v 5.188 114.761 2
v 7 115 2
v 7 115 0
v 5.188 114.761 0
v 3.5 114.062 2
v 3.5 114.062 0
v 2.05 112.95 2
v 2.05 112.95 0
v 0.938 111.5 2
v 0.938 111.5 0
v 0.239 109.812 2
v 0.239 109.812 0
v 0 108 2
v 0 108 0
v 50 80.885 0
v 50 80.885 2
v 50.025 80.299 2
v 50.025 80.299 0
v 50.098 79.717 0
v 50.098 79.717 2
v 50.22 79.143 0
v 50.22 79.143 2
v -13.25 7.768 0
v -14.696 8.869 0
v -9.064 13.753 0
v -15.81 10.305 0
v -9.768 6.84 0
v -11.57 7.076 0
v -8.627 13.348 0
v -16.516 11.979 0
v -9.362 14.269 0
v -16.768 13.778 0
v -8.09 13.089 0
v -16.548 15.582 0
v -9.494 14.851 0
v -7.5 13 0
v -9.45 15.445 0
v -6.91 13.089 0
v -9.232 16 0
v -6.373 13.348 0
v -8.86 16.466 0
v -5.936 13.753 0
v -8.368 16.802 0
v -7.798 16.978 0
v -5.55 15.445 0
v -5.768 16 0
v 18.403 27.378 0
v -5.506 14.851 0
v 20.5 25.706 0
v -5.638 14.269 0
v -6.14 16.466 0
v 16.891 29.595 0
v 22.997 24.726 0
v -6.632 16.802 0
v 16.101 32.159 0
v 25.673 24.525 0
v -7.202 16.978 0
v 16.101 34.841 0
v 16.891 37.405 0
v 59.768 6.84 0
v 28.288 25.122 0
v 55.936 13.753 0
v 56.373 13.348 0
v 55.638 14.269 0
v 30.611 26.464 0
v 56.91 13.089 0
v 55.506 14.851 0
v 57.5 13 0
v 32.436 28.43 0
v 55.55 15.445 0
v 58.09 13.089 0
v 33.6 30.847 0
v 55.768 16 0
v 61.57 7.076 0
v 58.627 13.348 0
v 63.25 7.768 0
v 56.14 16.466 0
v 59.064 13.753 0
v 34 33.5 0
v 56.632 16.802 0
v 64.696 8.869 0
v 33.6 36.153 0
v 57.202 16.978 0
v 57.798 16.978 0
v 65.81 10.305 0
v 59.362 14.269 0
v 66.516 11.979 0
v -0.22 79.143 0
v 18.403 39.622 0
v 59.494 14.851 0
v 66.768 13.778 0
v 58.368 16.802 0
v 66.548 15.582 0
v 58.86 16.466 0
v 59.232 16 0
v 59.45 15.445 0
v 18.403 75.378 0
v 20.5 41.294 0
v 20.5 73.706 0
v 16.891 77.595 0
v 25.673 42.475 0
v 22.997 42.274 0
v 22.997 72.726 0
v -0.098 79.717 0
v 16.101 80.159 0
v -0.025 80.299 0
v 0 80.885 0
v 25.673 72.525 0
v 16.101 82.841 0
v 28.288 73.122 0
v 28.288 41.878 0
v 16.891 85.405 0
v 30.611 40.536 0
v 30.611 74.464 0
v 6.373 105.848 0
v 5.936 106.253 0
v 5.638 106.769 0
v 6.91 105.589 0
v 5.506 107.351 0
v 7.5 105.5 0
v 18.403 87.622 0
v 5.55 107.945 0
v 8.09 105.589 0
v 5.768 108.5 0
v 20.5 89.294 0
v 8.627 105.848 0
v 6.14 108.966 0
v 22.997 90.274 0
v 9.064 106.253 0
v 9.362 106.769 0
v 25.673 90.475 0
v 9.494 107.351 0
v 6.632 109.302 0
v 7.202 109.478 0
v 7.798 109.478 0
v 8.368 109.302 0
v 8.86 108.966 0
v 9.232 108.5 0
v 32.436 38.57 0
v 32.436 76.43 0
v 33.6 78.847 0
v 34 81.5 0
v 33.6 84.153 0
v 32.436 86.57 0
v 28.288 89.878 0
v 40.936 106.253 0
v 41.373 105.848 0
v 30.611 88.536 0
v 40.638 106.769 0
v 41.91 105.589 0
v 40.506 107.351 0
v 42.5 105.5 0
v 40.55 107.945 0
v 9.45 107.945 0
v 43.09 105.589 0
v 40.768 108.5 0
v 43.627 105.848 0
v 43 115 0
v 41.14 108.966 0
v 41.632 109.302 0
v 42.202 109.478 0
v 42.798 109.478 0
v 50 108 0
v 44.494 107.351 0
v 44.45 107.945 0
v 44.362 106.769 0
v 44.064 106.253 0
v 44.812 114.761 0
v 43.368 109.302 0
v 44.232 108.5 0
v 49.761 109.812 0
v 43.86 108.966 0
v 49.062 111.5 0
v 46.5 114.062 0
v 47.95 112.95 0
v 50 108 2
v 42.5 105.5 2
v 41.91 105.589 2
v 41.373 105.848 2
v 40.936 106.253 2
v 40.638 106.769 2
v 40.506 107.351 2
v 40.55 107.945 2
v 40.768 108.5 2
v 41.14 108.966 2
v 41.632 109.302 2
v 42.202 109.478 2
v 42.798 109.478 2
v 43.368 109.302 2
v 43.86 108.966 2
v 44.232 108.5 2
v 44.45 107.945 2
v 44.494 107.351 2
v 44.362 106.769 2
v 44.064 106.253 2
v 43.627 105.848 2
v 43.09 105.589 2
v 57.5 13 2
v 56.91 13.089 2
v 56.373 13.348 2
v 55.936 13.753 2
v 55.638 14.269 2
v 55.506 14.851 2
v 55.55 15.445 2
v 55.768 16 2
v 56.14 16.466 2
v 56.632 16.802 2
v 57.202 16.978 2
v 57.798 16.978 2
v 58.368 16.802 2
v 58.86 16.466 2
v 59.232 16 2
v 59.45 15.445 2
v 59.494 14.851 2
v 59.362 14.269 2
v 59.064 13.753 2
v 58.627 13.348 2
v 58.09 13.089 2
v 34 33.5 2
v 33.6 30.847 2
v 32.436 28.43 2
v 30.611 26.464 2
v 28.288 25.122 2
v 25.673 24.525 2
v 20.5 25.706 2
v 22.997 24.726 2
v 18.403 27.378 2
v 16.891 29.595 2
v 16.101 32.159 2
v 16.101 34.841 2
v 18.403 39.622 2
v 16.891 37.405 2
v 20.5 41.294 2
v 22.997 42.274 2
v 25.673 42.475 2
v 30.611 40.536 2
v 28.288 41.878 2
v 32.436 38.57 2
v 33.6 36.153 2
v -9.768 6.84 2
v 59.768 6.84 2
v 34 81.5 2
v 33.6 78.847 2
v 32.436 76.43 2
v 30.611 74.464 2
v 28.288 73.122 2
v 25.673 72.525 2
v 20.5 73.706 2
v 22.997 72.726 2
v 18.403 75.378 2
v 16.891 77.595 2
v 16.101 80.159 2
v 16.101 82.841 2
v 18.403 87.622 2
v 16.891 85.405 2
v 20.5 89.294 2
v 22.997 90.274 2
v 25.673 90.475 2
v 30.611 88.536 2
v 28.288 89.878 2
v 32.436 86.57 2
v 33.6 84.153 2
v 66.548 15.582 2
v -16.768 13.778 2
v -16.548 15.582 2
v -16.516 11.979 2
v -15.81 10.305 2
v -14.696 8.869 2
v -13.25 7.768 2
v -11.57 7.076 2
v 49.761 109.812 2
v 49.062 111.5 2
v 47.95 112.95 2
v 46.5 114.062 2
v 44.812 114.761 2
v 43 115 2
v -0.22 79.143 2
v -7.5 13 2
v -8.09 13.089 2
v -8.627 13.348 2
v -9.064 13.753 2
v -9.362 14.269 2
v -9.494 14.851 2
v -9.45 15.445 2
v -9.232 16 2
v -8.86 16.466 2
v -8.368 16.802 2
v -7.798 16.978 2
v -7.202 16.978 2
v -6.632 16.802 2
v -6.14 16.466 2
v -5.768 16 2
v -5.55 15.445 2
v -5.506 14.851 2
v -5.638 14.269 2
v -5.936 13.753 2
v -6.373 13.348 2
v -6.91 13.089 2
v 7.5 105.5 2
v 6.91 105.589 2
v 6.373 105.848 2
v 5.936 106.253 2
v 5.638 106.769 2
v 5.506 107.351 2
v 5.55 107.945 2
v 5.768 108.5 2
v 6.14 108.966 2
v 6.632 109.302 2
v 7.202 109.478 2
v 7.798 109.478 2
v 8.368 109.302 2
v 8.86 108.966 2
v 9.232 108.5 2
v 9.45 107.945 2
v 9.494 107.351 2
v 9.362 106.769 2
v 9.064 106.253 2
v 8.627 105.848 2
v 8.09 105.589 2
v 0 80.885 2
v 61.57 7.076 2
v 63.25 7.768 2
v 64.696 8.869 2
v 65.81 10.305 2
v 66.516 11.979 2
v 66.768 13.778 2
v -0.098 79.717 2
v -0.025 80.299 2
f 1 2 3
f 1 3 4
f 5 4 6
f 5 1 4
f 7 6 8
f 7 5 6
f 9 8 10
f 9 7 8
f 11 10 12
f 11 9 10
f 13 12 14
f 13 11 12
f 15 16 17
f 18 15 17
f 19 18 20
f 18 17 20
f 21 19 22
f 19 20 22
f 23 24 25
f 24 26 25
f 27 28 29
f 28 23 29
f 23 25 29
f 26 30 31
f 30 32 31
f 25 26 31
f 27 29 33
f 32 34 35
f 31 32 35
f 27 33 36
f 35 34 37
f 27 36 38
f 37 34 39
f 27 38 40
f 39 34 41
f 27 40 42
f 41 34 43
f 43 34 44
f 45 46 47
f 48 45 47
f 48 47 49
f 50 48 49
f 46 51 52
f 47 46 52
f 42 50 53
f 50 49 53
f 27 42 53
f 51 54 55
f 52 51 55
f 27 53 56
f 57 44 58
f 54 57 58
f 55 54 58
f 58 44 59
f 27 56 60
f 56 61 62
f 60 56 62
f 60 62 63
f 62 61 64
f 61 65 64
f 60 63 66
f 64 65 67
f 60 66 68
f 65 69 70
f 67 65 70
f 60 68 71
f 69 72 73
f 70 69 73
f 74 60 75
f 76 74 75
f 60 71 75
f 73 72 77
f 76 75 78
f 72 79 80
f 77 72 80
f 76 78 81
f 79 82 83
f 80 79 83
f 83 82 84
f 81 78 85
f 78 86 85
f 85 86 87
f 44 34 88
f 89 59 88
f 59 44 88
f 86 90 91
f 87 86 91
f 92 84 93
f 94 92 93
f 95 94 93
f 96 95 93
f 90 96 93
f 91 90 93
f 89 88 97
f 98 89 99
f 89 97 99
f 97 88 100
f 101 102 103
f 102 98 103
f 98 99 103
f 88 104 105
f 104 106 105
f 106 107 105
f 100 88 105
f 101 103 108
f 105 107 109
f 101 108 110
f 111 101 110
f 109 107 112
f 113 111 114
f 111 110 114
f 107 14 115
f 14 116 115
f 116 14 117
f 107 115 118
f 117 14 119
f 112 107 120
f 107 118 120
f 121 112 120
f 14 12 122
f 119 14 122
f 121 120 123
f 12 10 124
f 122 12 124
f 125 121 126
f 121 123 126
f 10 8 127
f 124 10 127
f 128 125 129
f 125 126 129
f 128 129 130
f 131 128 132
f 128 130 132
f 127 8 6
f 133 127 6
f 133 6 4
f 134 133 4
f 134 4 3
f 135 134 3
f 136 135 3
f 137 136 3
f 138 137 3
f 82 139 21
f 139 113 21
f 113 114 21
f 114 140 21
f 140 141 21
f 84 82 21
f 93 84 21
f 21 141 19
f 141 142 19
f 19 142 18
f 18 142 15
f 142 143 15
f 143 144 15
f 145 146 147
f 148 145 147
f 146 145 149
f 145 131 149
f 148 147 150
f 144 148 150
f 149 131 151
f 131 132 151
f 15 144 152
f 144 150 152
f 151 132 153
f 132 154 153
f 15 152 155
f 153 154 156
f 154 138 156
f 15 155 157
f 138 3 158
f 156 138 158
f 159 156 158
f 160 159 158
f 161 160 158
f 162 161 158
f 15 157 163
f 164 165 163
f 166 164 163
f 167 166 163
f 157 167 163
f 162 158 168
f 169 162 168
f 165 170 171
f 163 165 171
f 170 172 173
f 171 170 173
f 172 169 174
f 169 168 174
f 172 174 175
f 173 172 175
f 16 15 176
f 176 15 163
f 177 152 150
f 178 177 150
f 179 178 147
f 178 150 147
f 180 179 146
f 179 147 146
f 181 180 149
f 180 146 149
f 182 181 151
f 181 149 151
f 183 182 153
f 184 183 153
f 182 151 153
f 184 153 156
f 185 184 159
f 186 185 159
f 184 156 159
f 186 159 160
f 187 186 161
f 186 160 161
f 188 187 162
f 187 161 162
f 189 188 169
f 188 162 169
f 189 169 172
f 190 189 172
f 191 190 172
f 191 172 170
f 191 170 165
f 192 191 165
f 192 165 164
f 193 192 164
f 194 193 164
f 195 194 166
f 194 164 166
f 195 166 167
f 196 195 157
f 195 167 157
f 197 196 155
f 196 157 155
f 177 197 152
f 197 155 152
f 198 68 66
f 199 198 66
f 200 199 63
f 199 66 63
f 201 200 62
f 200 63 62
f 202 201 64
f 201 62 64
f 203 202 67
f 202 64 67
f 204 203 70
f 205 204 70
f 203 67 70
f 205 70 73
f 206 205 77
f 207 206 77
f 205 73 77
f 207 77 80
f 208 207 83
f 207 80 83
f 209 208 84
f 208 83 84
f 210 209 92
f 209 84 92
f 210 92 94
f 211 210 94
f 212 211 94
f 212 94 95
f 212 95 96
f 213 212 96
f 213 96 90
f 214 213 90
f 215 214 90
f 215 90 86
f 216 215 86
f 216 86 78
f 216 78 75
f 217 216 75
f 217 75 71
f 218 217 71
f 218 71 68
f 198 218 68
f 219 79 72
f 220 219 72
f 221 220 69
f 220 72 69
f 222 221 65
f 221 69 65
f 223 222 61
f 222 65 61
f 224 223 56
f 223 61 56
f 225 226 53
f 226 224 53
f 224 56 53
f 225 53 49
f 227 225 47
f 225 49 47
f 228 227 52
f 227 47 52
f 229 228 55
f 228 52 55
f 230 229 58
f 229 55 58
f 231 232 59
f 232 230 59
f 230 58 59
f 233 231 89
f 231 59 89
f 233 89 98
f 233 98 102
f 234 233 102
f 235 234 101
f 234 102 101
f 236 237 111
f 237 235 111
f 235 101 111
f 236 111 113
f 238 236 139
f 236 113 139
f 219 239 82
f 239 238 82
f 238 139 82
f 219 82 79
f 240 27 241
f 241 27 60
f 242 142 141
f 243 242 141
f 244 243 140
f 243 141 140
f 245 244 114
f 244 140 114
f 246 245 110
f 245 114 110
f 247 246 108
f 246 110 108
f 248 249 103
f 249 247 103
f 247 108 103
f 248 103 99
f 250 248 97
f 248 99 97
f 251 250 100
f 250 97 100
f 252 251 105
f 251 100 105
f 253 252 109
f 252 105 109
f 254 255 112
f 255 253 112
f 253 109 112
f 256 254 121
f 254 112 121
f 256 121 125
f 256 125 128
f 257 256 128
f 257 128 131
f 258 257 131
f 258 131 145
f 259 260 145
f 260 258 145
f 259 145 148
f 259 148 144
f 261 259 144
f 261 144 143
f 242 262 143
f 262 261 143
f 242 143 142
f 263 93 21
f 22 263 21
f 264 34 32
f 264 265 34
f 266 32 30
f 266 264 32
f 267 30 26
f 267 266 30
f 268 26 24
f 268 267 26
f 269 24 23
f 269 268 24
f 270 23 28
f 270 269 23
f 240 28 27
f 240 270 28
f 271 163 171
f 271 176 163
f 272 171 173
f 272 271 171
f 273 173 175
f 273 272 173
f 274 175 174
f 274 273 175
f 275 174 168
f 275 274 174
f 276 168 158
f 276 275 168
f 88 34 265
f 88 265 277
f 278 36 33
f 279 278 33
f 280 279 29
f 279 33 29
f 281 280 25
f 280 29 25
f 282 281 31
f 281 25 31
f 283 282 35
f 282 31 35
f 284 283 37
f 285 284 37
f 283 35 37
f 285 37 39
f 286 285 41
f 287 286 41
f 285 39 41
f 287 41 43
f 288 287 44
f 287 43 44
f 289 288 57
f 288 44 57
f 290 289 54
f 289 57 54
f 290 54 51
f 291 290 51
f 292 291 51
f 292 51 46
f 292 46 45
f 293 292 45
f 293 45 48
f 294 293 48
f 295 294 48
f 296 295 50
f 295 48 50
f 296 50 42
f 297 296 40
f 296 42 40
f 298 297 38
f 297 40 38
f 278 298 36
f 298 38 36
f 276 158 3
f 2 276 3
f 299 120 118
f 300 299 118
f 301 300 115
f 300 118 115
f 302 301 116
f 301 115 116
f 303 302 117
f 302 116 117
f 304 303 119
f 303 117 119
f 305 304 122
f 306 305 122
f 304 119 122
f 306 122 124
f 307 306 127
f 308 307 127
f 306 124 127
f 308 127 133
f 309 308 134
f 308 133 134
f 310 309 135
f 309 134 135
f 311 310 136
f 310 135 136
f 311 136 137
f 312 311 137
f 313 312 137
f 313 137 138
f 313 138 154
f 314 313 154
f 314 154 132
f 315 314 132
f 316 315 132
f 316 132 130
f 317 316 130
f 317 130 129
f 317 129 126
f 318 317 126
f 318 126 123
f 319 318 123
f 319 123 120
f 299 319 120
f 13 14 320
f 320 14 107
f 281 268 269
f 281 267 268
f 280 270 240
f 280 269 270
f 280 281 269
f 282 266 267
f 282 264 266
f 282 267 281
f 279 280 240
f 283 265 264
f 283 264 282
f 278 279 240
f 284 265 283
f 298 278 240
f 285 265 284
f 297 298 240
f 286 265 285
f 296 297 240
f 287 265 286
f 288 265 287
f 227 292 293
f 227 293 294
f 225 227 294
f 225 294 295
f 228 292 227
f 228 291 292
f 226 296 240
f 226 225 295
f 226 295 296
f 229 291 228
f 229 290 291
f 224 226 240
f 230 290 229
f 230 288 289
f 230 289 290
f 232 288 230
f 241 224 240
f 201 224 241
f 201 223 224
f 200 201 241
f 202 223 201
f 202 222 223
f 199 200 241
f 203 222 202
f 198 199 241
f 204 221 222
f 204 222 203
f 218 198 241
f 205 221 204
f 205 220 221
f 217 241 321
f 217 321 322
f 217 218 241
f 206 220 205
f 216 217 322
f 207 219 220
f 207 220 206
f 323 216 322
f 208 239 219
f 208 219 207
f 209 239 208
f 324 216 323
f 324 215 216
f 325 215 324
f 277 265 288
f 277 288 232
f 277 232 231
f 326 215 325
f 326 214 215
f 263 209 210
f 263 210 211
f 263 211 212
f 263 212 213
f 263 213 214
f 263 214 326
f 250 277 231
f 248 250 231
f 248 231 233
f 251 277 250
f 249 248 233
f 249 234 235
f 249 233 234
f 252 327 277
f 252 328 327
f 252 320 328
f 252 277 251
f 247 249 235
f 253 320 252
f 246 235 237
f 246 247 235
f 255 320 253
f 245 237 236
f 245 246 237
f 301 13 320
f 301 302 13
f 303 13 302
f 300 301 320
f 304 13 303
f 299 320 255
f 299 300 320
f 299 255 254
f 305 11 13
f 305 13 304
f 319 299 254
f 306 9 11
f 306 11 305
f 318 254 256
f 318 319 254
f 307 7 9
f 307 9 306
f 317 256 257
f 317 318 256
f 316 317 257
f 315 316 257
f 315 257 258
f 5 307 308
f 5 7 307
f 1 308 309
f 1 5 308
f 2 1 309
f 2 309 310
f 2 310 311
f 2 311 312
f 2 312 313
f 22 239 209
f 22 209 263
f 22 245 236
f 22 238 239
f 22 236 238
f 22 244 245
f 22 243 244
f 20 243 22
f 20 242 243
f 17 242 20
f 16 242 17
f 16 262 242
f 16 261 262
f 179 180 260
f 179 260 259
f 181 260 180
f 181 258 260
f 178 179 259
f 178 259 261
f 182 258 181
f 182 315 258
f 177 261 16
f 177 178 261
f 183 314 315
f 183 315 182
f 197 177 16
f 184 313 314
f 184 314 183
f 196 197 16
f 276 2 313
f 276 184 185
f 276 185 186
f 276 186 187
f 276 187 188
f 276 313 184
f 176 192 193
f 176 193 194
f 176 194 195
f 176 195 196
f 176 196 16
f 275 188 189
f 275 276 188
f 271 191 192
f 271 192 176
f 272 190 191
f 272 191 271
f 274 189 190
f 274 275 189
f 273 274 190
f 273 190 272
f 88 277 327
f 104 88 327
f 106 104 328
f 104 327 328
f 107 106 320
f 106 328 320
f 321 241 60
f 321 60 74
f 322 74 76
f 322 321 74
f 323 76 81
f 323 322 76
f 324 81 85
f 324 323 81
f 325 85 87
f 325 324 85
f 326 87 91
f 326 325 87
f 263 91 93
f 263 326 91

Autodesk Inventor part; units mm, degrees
ref_plane "YZ Plane" through (0, 0, 0) normal (1, 0, 0) x (0, 1, 0)
ref_plane "XZ Plane" through (0, 0, 0) normal (0, 1, 0) x (-1, 0, 0)
ref_plane "XY Plane" through (0, 0, 0) normal (0, 0, 1) x (1, 0, 0)
sketch "スケッチ1" plane through (0, 0, 0) normal (0, 0, 1) x (1, 0, 0)
  line L0 (0, 0) -> (50, 0)
  line L1 (50, 0) -> (50, 115)
  line L2 (50, 115) -> (0, 115)
  line L3 (0, 115) -> (0, 0)
  circle A0 centre (25, 81.5) radius 9
  circle A1 centre (25, 33.5) radius 9
  line L4 (0, 0) -> (-18.7939, 6.8404)
  line L5 (-18.7939, 6.8404) -> (0, 80)
  line L6 (50, 0) -> (68.7939, 6.8404)
  line L7 (68.7939, 6.8404) -> (50, 80)
  line L8 (-18.7939, 6.8404) -> (68.7939, 6.8404)
  dimension "d0" = 50
  dimension "d1" = 115
  dimension "d2" = 18
  dimension "d3" = 18
  dimension "d5" = 48
  dimension "d8" = 33.5
  dimension "d27" = 20
  dimension "d28" = 20
  dimension "d34" = 80
  dimension "d35" = 80
  dimension "d36" = 20
  dimension "d37" = 20
extrude "押し出し1" add sketch "スケッチ1" along normal blind 2 contours L8 L5 L3 | L3 L2 L1 L8 | L1 L7 L8
sketch "スケッチ2" plane through (0, 0, 2) normal (0, 0, 1) x (1, 0, 0)
  line L0 (0, 115) -> (0, 0) projected
  line L1 (50, 80) -> (50, 115) projected
  line L2 (50, 115) -> (0, 115) projected
  point P0 (7.5, 107.5)
  point P1 (42.5, 107.5)
  point P2 (57.5, 15)
  point P3 (-7.5, 15)
  dimension "d15" = 7.5
  dimension "d16" = 7.5
  dimension "d17" = 7.5
  dimension "d18" = 7.5
  dimension "d31" = 7.5
  dimension "d32" = 7.5
  dimension "d40" = 15
  dimension "d41" = 15
hole "穴1" at (7.5, 107.5, 2) at (42.5, 107.5, 2) at (57.5, 15, 2) at (-7.5, 15, 2) direction (0, 0, -1) diameter 4 depth 8 tip angle 118
fillet "フィレット2" radius 7 6 edges at (50, 115, 1) (0, 115, 1) (0, 80, 1) (50, 80, 1) (-18.7939, 6.8404, 1) (68.7939, 6.8404, 1)
equation "\"d8\" = -0.5 * d5 + 0.5 * d1"
equation "\"d35\" = d34"
equation "\"d37\" = d36"
equation "\"d15\" = d18"
equation "\"d16\" = d18"
equation "\"d17\" = d18"
equation "\"d31\" = d18"
equation "\"d32\" = d18"
equation "\"d41\" = d40"
properties part number "TH22_AlBoard_roller_sub_sn" material "アルミニウム 6061-AHC"
